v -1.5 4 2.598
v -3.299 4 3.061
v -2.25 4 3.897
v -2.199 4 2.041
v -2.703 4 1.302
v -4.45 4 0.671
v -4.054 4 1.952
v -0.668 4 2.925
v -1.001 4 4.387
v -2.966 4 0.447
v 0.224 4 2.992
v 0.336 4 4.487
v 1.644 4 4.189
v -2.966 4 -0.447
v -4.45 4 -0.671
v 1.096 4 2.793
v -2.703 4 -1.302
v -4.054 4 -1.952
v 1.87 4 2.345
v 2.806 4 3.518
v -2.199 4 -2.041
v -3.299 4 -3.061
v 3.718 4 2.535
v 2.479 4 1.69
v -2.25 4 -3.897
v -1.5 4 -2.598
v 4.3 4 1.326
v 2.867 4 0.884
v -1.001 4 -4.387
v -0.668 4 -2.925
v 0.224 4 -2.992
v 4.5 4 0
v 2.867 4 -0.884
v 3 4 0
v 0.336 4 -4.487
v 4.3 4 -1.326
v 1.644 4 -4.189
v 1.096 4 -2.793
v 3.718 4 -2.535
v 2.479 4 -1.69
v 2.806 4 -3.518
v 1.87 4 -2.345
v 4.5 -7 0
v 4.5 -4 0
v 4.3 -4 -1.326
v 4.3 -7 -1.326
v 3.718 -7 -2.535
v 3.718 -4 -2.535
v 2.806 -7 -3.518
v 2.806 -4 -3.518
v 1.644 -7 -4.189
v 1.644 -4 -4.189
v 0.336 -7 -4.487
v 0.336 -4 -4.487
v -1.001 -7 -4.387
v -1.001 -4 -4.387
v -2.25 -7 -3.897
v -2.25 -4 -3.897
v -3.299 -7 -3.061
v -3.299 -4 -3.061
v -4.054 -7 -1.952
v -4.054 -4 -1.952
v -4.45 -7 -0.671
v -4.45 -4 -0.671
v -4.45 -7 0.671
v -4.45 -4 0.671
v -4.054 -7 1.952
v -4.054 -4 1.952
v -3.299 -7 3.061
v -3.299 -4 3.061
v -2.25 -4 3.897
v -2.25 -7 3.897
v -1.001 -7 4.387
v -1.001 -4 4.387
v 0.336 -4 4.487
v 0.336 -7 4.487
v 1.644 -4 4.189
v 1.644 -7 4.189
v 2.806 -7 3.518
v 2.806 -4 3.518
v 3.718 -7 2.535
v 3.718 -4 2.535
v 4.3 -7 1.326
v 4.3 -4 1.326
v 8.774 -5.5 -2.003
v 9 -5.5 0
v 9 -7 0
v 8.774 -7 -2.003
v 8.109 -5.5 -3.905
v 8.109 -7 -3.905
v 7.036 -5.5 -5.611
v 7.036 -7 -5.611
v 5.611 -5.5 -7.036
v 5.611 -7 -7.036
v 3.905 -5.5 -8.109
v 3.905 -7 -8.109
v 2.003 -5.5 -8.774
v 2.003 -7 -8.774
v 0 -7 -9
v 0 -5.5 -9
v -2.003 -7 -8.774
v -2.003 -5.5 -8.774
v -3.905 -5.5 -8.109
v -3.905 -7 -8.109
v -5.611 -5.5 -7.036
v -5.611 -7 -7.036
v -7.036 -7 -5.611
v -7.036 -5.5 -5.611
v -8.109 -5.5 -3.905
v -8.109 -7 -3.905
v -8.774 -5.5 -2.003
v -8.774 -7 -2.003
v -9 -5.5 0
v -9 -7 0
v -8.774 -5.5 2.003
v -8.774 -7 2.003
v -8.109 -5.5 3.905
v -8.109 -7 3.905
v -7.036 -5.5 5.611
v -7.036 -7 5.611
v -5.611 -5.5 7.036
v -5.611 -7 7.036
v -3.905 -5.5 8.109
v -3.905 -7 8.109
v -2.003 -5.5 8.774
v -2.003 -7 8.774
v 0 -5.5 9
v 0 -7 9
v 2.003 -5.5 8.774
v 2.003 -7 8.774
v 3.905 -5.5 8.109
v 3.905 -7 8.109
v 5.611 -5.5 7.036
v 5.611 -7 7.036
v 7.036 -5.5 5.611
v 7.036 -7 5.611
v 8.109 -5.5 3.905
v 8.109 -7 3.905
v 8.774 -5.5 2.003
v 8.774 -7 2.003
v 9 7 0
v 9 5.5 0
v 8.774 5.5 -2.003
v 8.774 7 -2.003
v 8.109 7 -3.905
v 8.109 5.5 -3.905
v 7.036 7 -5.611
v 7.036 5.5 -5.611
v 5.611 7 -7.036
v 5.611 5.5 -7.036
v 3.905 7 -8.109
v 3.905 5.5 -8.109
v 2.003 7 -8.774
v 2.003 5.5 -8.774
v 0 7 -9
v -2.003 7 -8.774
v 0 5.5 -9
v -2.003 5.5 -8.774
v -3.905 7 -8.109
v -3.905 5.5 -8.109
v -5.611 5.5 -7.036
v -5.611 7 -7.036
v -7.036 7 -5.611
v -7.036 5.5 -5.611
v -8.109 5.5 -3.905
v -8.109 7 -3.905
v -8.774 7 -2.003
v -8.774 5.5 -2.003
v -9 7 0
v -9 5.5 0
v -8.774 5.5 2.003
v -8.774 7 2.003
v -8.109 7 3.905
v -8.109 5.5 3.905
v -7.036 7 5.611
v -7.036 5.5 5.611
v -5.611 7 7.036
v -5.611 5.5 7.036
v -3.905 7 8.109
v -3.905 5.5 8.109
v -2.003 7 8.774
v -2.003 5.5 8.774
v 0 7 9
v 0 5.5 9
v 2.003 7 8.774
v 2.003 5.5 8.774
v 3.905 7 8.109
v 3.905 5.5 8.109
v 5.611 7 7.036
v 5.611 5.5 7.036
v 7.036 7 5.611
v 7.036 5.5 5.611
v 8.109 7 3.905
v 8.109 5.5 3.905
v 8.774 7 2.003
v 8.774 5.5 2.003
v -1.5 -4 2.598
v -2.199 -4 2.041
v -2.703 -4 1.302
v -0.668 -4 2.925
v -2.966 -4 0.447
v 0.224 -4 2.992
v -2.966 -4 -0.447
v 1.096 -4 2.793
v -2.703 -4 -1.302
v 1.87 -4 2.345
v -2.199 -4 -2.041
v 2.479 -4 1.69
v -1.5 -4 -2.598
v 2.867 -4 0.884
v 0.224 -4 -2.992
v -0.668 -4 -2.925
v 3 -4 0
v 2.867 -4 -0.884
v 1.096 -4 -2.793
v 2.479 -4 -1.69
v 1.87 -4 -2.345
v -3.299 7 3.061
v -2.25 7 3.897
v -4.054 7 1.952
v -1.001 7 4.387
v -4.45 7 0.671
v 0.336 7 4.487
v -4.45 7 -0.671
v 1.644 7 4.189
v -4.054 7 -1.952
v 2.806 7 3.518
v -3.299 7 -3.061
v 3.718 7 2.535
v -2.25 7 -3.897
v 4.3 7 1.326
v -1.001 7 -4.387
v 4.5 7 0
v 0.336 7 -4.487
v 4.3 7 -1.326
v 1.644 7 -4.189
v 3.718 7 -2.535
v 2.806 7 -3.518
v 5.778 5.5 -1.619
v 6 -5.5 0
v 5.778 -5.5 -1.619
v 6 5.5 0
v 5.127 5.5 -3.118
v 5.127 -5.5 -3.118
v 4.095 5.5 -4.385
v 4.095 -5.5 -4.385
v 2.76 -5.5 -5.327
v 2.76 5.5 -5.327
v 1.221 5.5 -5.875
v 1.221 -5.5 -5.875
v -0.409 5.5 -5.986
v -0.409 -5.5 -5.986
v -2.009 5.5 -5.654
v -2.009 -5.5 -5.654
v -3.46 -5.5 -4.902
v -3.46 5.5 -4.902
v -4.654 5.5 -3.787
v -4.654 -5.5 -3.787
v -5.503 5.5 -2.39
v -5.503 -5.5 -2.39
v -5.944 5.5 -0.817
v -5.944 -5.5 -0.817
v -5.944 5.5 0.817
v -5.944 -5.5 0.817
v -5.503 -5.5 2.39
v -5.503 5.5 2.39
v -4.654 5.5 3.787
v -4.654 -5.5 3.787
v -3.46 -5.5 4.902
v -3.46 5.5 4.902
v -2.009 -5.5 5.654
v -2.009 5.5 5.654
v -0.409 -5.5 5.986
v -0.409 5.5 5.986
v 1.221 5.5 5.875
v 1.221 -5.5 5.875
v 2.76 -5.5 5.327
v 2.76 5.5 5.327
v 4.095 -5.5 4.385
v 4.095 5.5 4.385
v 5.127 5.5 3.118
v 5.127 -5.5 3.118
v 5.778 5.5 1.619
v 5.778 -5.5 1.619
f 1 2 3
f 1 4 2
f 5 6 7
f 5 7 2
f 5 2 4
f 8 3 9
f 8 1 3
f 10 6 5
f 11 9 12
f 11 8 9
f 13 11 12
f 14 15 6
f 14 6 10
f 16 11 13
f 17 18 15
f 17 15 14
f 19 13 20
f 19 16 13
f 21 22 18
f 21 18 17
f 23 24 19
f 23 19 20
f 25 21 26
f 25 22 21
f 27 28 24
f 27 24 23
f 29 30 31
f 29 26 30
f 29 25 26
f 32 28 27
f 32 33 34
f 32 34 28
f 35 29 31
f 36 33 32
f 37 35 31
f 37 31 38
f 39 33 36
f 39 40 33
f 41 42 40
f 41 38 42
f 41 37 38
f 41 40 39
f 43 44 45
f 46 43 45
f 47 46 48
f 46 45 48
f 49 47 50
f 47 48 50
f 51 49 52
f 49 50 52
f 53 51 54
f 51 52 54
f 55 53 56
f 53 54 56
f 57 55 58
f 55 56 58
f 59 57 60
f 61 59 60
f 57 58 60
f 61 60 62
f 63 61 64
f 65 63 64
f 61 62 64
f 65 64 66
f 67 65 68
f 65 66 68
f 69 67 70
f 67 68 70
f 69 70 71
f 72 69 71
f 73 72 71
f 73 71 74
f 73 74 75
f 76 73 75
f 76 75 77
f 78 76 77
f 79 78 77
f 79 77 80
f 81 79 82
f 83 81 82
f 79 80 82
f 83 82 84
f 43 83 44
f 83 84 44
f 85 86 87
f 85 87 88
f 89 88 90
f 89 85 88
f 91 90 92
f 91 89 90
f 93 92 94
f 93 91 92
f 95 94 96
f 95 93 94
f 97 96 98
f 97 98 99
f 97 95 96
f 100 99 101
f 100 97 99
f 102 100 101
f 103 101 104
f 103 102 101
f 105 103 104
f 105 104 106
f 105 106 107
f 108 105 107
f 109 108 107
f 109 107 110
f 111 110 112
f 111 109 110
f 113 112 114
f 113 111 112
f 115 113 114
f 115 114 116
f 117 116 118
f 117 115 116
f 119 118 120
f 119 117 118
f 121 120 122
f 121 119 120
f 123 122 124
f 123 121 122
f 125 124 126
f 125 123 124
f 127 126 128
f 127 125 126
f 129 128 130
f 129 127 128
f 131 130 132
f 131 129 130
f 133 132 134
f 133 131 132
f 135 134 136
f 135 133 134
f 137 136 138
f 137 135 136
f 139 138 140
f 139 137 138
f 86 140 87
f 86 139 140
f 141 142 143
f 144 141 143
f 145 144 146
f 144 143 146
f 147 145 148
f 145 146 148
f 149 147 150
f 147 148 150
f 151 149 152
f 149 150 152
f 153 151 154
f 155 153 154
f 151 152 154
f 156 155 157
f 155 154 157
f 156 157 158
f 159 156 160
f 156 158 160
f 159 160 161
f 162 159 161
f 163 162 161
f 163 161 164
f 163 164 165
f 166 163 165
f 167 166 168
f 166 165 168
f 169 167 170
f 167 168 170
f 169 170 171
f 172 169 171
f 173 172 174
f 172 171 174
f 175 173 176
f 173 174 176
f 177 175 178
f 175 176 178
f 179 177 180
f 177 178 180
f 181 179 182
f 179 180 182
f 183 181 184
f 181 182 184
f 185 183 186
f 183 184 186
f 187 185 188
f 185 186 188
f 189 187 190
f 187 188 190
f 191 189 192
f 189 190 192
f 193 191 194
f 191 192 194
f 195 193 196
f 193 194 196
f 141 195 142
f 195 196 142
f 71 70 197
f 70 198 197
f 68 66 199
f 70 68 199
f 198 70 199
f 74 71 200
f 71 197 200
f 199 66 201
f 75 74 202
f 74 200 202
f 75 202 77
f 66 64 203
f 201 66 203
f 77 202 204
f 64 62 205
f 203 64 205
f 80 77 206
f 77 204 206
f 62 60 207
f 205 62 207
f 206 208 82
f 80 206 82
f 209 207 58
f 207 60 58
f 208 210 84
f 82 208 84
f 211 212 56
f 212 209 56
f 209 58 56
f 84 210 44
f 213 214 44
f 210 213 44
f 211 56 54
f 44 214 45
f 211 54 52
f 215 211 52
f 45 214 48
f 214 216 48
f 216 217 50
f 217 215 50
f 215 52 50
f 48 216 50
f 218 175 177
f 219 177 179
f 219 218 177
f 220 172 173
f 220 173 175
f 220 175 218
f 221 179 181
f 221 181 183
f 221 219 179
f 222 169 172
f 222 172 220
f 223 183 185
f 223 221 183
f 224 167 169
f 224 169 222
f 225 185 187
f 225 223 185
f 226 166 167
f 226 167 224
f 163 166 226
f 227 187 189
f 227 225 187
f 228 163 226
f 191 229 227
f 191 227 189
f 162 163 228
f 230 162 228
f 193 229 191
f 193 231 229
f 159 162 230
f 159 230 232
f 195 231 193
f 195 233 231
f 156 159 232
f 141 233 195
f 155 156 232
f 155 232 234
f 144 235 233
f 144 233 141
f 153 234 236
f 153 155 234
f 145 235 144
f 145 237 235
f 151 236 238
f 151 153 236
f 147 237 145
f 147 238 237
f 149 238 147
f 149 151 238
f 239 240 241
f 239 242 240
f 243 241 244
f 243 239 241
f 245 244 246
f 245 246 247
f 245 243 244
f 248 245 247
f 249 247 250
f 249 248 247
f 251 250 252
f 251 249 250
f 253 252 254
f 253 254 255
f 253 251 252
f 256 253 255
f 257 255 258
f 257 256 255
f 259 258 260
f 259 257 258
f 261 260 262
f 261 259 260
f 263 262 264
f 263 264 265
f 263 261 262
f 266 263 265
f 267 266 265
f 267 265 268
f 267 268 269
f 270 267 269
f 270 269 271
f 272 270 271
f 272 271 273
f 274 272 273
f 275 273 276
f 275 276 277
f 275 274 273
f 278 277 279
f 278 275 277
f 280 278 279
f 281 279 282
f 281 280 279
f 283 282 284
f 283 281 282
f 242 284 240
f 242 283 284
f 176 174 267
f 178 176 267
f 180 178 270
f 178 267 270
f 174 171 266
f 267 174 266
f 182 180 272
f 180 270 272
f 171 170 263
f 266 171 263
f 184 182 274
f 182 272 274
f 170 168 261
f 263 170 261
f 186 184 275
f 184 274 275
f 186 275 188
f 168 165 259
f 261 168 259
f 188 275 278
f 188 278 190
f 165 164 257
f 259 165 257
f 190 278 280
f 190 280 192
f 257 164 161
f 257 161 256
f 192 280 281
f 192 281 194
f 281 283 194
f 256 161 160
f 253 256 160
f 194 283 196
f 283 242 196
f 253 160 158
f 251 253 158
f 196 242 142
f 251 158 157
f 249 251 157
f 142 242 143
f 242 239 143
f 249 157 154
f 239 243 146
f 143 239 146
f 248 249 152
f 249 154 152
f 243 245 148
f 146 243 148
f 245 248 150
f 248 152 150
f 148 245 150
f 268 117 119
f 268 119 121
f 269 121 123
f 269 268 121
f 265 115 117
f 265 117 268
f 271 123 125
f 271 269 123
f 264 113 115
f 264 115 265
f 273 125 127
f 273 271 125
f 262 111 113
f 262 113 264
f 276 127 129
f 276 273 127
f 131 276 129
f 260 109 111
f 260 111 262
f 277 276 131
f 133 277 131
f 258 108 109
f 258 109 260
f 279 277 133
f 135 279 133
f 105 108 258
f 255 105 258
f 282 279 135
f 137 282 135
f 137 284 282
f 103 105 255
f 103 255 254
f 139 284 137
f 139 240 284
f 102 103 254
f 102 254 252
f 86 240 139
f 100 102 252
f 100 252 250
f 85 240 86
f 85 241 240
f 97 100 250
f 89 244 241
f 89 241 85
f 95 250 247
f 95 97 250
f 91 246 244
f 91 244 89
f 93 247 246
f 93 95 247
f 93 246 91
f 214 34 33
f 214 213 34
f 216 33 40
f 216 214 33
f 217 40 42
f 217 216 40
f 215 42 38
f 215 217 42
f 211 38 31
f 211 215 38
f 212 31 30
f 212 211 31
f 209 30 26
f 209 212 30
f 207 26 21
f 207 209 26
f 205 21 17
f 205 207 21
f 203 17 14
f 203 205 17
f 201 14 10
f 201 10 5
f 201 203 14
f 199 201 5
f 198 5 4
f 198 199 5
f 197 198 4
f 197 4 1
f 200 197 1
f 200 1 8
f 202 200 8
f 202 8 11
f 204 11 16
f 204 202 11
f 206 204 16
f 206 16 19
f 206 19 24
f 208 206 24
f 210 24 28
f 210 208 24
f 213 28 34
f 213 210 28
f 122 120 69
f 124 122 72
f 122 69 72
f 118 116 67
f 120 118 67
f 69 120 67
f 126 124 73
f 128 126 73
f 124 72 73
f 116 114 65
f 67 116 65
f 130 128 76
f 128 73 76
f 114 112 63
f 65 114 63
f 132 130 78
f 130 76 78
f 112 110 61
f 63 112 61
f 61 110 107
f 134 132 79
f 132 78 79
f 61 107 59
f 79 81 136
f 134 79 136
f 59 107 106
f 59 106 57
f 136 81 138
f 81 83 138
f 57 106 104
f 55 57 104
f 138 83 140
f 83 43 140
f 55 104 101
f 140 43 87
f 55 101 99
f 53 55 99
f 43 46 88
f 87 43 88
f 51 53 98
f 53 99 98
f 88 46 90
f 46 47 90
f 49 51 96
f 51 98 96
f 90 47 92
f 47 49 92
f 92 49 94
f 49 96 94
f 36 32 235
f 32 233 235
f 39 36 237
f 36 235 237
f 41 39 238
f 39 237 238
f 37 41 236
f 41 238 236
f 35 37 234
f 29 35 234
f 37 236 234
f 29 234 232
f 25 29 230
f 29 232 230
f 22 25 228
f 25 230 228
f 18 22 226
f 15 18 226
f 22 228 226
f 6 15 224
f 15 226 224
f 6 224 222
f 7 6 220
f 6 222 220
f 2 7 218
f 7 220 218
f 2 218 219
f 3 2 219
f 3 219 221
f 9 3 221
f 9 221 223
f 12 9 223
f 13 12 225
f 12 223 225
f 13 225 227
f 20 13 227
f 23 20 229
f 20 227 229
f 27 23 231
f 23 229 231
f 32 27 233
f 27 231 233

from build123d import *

# Parameters (mm, degrees)
SKETCH1_R           = 6
SKETCH1_R_2         = 4.5
BOSS_EXTRUDE1_DEPTH = 5.5
SKETCH2_R           = 9
SKETCH2_R_2         = 4.5
BOSS_EXTRUDE2_DEPTH = 1.5
SKETCH3_R           = 4.5
SKETCH3_R_2         = 3
BOSS_EXTRUDE3_DEPTH = 4


with BuildPart() as part:
    # Sketch1 → Boss-Extrude1 (new body, symmetric)
    with BuildSketch(Plane(origin=(0, 0, 0), x_dir=(1, 0, 0), z_dir=(0, 1, 0))):
        Circle(SKETCH1_R)
        Circle(SKETCH1_R_2, mode=Mode.SUBTRACT)
    extrude(amount=BOSS_EXTRUDE1_DEPTH, both=True)

    # Sketch2 → Boss-Extrude2 (add)
    with BuildSketch(Plane(origin=(0, 5.5, 0), x_dir=(1, 0, 0), z_dir=(0, 1, 0))):
        Circle(SKETCH2_R)
        Circle(SKETCH2_R_2, mode=Mode.SUBTRACT)
    boss_extrude2 = extrude(amount=BOSS_EXTRUDE2_DEPTH)

    # Mirror1: Boss-Extrude2 across plane
    add(boss_extrude2.mirror(Plane.ZX))

    # Sketch3 → Boss-Extrude3 (add, symmetric)
    with BuildSketch(Plane(origin=(0, 0, 0), x_dir=(1, 0, 0), z_dir=(0, 1, 0))):
        Circle(SKETCH3_R)
        Circle(SKETCH3_R_2, mode=Mode.SUBTRACT)
    extrude(amount=BOSS_EXTRUDE3_DEPTH, both=True)


solid = part.part
